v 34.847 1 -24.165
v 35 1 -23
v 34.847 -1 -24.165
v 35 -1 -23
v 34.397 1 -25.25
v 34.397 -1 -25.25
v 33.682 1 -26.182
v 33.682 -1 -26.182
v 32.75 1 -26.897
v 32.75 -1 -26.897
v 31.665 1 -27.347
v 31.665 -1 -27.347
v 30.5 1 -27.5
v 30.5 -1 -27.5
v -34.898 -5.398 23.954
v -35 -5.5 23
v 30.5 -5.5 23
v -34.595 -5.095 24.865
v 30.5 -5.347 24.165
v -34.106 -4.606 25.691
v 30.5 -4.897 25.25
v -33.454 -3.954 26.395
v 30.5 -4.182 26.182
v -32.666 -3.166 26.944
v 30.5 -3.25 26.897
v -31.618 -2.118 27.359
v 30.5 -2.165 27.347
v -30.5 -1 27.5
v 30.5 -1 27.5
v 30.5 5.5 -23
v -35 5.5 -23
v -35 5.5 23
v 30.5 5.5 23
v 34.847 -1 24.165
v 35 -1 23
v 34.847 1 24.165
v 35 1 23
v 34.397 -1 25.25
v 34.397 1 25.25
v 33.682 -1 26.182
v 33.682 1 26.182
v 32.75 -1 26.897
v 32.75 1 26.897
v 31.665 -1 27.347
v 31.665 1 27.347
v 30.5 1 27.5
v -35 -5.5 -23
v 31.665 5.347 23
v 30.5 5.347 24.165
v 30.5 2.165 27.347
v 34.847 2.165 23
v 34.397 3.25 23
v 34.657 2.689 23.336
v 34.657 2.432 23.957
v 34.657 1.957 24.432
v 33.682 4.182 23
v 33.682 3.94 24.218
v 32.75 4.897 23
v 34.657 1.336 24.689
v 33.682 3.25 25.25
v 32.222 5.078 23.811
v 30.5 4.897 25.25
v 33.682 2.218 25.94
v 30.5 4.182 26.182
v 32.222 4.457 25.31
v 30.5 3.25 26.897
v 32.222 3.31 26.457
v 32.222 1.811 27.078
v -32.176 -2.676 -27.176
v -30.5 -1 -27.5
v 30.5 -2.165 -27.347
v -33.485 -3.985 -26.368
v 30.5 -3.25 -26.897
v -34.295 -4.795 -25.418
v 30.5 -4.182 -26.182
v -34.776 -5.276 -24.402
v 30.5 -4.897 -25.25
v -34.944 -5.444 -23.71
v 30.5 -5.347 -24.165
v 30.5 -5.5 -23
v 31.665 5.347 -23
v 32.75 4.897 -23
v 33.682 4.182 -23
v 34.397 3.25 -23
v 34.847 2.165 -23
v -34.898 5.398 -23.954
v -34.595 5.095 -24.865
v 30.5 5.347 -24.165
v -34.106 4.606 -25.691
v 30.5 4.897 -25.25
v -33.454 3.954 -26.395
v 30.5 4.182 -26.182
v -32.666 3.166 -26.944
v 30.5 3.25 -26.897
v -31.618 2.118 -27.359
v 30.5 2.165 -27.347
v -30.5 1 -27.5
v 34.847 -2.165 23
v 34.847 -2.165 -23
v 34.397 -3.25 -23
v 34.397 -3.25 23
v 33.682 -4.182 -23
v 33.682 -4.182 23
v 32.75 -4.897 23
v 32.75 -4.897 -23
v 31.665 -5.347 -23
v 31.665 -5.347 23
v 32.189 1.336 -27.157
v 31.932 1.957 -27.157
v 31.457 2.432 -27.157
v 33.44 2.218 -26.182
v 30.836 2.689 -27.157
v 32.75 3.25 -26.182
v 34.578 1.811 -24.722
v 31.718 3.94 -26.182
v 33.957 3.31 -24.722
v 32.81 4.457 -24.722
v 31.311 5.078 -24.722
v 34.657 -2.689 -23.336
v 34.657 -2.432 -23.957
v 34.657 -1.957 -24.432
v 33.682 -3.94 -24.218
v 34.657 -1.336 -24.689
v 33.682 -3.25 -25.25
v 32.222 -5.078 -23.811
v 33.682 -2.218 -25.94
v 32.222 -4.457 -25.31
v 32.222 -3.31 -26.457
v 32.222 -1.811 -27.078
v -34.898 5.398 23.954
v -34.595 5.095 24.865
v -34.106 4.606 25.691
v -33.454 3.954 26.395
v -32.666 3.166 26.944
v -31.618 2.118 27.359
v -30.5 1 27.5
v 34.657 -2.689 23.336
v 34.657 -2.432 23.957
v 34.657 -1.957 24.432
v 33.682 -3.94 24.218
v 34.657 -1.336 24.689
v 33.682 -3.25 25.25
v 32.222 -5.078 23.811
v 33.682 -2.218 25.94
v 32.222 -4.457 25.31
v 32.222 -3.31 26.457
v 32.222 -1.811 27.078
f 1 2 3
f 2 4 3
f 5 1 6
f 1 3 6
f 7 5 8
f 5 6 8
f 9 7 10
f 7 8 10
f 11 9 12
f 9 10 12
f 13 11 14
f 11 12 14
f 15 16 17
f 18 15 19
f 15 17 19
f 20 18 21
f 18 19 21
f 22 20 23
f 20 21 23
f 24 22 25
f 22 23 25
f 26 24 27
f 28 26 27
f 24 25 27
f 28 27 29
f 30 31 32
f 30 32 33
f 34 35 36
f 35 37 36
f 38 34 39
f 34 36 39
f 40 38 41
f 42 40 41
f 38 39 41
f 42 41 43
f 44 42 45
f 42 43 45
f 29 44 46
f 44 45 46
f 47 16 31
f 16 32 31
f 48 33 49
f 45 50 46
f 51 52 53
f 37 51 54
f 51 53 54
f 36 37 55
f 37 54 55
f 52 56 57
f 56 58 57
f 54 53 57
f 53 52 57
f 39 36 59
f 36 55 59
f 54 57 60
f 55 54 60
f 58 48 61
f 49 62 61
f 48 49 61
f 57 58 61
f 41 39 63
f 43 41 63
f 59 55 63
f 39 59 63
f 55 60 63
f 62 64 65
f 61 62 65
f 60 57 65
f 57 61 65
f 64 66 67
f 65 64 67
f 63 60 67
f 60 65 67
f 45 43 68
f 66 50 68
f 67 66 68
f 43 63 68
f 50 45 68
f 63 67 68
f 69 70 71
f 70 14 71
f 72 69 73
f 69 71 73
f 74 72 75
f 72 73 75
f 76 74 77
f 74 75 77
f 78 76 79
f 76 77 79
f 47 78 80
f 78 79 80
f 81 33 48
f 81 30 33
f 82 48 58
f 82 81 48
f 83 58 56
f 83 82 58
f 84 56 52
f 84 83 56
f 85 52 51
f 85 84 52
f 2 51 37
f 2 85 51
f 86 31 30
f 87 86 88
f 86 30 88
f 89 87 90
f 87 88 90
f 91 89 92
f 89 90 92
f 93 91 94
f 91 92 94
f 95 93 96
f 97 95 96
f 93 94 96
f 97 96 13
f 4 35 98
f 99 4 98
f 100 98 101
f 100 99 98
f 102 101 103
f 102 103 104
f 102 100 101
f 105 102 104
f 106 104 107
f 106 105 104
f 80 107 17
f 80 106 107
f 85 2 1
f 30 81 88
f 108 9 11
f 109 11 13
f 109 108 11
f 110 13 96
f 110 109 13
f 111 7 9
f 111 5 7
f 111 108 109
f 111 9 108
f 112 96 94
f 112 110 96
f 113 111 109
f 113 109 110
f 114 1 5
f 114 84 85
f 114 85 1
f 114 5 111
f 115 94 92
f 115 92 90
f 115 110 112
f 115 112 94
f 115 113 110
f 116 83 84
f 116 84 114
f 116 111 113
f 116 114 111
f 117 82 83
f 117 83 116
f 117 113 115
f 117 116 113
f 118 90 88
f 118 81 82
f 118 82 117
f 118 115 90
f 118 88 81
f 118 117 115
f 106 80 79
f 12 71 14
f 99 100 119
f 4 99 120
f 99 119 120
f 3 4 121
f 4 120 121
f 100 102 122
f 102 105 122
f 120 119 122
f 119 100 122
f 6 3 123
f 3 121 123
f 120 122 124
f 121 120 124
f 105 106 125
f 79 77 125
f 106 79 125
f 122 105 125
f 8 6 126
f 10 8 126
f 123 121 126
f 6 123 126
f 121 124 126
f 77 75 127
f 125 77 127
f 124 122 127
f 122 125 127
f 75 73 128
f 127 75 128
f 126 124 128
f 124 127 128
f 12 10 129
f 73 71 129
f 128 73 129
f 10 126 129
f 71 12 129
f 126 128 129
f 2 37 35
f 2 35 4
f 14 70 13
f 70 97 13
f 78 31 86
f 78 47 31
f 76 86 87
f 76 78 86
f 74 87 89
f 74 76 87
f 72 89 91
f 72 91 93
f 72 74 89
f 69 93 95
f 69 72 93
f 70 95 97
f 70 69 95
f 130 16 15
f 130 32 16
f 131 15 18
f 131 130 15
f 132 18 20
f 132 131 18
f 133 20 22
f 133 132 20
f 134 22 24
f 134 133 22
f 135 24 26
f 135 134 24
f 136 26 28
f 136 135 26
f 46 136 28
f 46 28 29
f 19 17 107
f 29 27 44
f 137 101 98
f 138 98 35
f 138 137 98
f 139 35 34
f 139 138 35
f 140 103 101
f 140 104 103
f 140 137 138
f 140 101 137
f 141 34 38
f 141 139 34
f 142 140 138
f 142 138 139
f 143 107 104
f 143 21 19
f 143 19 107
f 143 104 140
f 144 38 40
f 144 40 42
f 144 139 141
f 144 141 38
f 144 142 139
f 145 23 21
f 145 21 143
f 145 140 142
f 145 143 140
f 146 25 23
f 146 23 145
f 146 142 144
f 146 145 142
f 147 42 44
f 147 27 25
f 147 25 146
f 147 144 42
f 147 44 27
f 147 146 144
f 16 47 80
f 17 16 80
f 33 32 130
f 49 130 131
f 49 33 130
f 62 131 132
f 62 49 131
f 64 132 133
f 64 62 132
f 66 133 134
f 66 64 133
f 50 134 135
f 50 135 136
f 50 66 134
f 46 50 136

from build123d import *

# Parameters (mm, degrees)
SKETCH1_W           = 70
SKETCH1_H           = 55
BOSS_EXTRUDE1_DEPTH = 5.5
FILLET1_R           = 4.5


with BuildPart() as part:
    # Sketch1 → Boss-Extrude1 (new, symmetric)
    with BuildSketch(Plane(origin=(0, 0, 0), x_dir=(1, 0, 0), z_dir=(0, 1, 0))):
        Rectangle(SKETCH1_W, SKETCH1_H)
    extrude(amount=BOSS_EXTRUDE1_DEPTH, both=True)

    # Fillet1
    fillet1_edges = [part.edges().sort_by_distance(p)[0] for p in [
        (0, 5.5, 27.5),
        (35, 5.5, 0),
        (0, -5.5, 27.5),
        (0, -5.5, -27.5),
        (35, -5.5, 0),
        (35, 0, 27.5),
        (-35, 0, 27.5),
        (-35, 0, -27.5),
        (35, 0, -27.5),
        (0, 5.5, -27.5),
    ]]
    fillet(fillet1_edges, radius=FILLET1_R)


solid = part.part
